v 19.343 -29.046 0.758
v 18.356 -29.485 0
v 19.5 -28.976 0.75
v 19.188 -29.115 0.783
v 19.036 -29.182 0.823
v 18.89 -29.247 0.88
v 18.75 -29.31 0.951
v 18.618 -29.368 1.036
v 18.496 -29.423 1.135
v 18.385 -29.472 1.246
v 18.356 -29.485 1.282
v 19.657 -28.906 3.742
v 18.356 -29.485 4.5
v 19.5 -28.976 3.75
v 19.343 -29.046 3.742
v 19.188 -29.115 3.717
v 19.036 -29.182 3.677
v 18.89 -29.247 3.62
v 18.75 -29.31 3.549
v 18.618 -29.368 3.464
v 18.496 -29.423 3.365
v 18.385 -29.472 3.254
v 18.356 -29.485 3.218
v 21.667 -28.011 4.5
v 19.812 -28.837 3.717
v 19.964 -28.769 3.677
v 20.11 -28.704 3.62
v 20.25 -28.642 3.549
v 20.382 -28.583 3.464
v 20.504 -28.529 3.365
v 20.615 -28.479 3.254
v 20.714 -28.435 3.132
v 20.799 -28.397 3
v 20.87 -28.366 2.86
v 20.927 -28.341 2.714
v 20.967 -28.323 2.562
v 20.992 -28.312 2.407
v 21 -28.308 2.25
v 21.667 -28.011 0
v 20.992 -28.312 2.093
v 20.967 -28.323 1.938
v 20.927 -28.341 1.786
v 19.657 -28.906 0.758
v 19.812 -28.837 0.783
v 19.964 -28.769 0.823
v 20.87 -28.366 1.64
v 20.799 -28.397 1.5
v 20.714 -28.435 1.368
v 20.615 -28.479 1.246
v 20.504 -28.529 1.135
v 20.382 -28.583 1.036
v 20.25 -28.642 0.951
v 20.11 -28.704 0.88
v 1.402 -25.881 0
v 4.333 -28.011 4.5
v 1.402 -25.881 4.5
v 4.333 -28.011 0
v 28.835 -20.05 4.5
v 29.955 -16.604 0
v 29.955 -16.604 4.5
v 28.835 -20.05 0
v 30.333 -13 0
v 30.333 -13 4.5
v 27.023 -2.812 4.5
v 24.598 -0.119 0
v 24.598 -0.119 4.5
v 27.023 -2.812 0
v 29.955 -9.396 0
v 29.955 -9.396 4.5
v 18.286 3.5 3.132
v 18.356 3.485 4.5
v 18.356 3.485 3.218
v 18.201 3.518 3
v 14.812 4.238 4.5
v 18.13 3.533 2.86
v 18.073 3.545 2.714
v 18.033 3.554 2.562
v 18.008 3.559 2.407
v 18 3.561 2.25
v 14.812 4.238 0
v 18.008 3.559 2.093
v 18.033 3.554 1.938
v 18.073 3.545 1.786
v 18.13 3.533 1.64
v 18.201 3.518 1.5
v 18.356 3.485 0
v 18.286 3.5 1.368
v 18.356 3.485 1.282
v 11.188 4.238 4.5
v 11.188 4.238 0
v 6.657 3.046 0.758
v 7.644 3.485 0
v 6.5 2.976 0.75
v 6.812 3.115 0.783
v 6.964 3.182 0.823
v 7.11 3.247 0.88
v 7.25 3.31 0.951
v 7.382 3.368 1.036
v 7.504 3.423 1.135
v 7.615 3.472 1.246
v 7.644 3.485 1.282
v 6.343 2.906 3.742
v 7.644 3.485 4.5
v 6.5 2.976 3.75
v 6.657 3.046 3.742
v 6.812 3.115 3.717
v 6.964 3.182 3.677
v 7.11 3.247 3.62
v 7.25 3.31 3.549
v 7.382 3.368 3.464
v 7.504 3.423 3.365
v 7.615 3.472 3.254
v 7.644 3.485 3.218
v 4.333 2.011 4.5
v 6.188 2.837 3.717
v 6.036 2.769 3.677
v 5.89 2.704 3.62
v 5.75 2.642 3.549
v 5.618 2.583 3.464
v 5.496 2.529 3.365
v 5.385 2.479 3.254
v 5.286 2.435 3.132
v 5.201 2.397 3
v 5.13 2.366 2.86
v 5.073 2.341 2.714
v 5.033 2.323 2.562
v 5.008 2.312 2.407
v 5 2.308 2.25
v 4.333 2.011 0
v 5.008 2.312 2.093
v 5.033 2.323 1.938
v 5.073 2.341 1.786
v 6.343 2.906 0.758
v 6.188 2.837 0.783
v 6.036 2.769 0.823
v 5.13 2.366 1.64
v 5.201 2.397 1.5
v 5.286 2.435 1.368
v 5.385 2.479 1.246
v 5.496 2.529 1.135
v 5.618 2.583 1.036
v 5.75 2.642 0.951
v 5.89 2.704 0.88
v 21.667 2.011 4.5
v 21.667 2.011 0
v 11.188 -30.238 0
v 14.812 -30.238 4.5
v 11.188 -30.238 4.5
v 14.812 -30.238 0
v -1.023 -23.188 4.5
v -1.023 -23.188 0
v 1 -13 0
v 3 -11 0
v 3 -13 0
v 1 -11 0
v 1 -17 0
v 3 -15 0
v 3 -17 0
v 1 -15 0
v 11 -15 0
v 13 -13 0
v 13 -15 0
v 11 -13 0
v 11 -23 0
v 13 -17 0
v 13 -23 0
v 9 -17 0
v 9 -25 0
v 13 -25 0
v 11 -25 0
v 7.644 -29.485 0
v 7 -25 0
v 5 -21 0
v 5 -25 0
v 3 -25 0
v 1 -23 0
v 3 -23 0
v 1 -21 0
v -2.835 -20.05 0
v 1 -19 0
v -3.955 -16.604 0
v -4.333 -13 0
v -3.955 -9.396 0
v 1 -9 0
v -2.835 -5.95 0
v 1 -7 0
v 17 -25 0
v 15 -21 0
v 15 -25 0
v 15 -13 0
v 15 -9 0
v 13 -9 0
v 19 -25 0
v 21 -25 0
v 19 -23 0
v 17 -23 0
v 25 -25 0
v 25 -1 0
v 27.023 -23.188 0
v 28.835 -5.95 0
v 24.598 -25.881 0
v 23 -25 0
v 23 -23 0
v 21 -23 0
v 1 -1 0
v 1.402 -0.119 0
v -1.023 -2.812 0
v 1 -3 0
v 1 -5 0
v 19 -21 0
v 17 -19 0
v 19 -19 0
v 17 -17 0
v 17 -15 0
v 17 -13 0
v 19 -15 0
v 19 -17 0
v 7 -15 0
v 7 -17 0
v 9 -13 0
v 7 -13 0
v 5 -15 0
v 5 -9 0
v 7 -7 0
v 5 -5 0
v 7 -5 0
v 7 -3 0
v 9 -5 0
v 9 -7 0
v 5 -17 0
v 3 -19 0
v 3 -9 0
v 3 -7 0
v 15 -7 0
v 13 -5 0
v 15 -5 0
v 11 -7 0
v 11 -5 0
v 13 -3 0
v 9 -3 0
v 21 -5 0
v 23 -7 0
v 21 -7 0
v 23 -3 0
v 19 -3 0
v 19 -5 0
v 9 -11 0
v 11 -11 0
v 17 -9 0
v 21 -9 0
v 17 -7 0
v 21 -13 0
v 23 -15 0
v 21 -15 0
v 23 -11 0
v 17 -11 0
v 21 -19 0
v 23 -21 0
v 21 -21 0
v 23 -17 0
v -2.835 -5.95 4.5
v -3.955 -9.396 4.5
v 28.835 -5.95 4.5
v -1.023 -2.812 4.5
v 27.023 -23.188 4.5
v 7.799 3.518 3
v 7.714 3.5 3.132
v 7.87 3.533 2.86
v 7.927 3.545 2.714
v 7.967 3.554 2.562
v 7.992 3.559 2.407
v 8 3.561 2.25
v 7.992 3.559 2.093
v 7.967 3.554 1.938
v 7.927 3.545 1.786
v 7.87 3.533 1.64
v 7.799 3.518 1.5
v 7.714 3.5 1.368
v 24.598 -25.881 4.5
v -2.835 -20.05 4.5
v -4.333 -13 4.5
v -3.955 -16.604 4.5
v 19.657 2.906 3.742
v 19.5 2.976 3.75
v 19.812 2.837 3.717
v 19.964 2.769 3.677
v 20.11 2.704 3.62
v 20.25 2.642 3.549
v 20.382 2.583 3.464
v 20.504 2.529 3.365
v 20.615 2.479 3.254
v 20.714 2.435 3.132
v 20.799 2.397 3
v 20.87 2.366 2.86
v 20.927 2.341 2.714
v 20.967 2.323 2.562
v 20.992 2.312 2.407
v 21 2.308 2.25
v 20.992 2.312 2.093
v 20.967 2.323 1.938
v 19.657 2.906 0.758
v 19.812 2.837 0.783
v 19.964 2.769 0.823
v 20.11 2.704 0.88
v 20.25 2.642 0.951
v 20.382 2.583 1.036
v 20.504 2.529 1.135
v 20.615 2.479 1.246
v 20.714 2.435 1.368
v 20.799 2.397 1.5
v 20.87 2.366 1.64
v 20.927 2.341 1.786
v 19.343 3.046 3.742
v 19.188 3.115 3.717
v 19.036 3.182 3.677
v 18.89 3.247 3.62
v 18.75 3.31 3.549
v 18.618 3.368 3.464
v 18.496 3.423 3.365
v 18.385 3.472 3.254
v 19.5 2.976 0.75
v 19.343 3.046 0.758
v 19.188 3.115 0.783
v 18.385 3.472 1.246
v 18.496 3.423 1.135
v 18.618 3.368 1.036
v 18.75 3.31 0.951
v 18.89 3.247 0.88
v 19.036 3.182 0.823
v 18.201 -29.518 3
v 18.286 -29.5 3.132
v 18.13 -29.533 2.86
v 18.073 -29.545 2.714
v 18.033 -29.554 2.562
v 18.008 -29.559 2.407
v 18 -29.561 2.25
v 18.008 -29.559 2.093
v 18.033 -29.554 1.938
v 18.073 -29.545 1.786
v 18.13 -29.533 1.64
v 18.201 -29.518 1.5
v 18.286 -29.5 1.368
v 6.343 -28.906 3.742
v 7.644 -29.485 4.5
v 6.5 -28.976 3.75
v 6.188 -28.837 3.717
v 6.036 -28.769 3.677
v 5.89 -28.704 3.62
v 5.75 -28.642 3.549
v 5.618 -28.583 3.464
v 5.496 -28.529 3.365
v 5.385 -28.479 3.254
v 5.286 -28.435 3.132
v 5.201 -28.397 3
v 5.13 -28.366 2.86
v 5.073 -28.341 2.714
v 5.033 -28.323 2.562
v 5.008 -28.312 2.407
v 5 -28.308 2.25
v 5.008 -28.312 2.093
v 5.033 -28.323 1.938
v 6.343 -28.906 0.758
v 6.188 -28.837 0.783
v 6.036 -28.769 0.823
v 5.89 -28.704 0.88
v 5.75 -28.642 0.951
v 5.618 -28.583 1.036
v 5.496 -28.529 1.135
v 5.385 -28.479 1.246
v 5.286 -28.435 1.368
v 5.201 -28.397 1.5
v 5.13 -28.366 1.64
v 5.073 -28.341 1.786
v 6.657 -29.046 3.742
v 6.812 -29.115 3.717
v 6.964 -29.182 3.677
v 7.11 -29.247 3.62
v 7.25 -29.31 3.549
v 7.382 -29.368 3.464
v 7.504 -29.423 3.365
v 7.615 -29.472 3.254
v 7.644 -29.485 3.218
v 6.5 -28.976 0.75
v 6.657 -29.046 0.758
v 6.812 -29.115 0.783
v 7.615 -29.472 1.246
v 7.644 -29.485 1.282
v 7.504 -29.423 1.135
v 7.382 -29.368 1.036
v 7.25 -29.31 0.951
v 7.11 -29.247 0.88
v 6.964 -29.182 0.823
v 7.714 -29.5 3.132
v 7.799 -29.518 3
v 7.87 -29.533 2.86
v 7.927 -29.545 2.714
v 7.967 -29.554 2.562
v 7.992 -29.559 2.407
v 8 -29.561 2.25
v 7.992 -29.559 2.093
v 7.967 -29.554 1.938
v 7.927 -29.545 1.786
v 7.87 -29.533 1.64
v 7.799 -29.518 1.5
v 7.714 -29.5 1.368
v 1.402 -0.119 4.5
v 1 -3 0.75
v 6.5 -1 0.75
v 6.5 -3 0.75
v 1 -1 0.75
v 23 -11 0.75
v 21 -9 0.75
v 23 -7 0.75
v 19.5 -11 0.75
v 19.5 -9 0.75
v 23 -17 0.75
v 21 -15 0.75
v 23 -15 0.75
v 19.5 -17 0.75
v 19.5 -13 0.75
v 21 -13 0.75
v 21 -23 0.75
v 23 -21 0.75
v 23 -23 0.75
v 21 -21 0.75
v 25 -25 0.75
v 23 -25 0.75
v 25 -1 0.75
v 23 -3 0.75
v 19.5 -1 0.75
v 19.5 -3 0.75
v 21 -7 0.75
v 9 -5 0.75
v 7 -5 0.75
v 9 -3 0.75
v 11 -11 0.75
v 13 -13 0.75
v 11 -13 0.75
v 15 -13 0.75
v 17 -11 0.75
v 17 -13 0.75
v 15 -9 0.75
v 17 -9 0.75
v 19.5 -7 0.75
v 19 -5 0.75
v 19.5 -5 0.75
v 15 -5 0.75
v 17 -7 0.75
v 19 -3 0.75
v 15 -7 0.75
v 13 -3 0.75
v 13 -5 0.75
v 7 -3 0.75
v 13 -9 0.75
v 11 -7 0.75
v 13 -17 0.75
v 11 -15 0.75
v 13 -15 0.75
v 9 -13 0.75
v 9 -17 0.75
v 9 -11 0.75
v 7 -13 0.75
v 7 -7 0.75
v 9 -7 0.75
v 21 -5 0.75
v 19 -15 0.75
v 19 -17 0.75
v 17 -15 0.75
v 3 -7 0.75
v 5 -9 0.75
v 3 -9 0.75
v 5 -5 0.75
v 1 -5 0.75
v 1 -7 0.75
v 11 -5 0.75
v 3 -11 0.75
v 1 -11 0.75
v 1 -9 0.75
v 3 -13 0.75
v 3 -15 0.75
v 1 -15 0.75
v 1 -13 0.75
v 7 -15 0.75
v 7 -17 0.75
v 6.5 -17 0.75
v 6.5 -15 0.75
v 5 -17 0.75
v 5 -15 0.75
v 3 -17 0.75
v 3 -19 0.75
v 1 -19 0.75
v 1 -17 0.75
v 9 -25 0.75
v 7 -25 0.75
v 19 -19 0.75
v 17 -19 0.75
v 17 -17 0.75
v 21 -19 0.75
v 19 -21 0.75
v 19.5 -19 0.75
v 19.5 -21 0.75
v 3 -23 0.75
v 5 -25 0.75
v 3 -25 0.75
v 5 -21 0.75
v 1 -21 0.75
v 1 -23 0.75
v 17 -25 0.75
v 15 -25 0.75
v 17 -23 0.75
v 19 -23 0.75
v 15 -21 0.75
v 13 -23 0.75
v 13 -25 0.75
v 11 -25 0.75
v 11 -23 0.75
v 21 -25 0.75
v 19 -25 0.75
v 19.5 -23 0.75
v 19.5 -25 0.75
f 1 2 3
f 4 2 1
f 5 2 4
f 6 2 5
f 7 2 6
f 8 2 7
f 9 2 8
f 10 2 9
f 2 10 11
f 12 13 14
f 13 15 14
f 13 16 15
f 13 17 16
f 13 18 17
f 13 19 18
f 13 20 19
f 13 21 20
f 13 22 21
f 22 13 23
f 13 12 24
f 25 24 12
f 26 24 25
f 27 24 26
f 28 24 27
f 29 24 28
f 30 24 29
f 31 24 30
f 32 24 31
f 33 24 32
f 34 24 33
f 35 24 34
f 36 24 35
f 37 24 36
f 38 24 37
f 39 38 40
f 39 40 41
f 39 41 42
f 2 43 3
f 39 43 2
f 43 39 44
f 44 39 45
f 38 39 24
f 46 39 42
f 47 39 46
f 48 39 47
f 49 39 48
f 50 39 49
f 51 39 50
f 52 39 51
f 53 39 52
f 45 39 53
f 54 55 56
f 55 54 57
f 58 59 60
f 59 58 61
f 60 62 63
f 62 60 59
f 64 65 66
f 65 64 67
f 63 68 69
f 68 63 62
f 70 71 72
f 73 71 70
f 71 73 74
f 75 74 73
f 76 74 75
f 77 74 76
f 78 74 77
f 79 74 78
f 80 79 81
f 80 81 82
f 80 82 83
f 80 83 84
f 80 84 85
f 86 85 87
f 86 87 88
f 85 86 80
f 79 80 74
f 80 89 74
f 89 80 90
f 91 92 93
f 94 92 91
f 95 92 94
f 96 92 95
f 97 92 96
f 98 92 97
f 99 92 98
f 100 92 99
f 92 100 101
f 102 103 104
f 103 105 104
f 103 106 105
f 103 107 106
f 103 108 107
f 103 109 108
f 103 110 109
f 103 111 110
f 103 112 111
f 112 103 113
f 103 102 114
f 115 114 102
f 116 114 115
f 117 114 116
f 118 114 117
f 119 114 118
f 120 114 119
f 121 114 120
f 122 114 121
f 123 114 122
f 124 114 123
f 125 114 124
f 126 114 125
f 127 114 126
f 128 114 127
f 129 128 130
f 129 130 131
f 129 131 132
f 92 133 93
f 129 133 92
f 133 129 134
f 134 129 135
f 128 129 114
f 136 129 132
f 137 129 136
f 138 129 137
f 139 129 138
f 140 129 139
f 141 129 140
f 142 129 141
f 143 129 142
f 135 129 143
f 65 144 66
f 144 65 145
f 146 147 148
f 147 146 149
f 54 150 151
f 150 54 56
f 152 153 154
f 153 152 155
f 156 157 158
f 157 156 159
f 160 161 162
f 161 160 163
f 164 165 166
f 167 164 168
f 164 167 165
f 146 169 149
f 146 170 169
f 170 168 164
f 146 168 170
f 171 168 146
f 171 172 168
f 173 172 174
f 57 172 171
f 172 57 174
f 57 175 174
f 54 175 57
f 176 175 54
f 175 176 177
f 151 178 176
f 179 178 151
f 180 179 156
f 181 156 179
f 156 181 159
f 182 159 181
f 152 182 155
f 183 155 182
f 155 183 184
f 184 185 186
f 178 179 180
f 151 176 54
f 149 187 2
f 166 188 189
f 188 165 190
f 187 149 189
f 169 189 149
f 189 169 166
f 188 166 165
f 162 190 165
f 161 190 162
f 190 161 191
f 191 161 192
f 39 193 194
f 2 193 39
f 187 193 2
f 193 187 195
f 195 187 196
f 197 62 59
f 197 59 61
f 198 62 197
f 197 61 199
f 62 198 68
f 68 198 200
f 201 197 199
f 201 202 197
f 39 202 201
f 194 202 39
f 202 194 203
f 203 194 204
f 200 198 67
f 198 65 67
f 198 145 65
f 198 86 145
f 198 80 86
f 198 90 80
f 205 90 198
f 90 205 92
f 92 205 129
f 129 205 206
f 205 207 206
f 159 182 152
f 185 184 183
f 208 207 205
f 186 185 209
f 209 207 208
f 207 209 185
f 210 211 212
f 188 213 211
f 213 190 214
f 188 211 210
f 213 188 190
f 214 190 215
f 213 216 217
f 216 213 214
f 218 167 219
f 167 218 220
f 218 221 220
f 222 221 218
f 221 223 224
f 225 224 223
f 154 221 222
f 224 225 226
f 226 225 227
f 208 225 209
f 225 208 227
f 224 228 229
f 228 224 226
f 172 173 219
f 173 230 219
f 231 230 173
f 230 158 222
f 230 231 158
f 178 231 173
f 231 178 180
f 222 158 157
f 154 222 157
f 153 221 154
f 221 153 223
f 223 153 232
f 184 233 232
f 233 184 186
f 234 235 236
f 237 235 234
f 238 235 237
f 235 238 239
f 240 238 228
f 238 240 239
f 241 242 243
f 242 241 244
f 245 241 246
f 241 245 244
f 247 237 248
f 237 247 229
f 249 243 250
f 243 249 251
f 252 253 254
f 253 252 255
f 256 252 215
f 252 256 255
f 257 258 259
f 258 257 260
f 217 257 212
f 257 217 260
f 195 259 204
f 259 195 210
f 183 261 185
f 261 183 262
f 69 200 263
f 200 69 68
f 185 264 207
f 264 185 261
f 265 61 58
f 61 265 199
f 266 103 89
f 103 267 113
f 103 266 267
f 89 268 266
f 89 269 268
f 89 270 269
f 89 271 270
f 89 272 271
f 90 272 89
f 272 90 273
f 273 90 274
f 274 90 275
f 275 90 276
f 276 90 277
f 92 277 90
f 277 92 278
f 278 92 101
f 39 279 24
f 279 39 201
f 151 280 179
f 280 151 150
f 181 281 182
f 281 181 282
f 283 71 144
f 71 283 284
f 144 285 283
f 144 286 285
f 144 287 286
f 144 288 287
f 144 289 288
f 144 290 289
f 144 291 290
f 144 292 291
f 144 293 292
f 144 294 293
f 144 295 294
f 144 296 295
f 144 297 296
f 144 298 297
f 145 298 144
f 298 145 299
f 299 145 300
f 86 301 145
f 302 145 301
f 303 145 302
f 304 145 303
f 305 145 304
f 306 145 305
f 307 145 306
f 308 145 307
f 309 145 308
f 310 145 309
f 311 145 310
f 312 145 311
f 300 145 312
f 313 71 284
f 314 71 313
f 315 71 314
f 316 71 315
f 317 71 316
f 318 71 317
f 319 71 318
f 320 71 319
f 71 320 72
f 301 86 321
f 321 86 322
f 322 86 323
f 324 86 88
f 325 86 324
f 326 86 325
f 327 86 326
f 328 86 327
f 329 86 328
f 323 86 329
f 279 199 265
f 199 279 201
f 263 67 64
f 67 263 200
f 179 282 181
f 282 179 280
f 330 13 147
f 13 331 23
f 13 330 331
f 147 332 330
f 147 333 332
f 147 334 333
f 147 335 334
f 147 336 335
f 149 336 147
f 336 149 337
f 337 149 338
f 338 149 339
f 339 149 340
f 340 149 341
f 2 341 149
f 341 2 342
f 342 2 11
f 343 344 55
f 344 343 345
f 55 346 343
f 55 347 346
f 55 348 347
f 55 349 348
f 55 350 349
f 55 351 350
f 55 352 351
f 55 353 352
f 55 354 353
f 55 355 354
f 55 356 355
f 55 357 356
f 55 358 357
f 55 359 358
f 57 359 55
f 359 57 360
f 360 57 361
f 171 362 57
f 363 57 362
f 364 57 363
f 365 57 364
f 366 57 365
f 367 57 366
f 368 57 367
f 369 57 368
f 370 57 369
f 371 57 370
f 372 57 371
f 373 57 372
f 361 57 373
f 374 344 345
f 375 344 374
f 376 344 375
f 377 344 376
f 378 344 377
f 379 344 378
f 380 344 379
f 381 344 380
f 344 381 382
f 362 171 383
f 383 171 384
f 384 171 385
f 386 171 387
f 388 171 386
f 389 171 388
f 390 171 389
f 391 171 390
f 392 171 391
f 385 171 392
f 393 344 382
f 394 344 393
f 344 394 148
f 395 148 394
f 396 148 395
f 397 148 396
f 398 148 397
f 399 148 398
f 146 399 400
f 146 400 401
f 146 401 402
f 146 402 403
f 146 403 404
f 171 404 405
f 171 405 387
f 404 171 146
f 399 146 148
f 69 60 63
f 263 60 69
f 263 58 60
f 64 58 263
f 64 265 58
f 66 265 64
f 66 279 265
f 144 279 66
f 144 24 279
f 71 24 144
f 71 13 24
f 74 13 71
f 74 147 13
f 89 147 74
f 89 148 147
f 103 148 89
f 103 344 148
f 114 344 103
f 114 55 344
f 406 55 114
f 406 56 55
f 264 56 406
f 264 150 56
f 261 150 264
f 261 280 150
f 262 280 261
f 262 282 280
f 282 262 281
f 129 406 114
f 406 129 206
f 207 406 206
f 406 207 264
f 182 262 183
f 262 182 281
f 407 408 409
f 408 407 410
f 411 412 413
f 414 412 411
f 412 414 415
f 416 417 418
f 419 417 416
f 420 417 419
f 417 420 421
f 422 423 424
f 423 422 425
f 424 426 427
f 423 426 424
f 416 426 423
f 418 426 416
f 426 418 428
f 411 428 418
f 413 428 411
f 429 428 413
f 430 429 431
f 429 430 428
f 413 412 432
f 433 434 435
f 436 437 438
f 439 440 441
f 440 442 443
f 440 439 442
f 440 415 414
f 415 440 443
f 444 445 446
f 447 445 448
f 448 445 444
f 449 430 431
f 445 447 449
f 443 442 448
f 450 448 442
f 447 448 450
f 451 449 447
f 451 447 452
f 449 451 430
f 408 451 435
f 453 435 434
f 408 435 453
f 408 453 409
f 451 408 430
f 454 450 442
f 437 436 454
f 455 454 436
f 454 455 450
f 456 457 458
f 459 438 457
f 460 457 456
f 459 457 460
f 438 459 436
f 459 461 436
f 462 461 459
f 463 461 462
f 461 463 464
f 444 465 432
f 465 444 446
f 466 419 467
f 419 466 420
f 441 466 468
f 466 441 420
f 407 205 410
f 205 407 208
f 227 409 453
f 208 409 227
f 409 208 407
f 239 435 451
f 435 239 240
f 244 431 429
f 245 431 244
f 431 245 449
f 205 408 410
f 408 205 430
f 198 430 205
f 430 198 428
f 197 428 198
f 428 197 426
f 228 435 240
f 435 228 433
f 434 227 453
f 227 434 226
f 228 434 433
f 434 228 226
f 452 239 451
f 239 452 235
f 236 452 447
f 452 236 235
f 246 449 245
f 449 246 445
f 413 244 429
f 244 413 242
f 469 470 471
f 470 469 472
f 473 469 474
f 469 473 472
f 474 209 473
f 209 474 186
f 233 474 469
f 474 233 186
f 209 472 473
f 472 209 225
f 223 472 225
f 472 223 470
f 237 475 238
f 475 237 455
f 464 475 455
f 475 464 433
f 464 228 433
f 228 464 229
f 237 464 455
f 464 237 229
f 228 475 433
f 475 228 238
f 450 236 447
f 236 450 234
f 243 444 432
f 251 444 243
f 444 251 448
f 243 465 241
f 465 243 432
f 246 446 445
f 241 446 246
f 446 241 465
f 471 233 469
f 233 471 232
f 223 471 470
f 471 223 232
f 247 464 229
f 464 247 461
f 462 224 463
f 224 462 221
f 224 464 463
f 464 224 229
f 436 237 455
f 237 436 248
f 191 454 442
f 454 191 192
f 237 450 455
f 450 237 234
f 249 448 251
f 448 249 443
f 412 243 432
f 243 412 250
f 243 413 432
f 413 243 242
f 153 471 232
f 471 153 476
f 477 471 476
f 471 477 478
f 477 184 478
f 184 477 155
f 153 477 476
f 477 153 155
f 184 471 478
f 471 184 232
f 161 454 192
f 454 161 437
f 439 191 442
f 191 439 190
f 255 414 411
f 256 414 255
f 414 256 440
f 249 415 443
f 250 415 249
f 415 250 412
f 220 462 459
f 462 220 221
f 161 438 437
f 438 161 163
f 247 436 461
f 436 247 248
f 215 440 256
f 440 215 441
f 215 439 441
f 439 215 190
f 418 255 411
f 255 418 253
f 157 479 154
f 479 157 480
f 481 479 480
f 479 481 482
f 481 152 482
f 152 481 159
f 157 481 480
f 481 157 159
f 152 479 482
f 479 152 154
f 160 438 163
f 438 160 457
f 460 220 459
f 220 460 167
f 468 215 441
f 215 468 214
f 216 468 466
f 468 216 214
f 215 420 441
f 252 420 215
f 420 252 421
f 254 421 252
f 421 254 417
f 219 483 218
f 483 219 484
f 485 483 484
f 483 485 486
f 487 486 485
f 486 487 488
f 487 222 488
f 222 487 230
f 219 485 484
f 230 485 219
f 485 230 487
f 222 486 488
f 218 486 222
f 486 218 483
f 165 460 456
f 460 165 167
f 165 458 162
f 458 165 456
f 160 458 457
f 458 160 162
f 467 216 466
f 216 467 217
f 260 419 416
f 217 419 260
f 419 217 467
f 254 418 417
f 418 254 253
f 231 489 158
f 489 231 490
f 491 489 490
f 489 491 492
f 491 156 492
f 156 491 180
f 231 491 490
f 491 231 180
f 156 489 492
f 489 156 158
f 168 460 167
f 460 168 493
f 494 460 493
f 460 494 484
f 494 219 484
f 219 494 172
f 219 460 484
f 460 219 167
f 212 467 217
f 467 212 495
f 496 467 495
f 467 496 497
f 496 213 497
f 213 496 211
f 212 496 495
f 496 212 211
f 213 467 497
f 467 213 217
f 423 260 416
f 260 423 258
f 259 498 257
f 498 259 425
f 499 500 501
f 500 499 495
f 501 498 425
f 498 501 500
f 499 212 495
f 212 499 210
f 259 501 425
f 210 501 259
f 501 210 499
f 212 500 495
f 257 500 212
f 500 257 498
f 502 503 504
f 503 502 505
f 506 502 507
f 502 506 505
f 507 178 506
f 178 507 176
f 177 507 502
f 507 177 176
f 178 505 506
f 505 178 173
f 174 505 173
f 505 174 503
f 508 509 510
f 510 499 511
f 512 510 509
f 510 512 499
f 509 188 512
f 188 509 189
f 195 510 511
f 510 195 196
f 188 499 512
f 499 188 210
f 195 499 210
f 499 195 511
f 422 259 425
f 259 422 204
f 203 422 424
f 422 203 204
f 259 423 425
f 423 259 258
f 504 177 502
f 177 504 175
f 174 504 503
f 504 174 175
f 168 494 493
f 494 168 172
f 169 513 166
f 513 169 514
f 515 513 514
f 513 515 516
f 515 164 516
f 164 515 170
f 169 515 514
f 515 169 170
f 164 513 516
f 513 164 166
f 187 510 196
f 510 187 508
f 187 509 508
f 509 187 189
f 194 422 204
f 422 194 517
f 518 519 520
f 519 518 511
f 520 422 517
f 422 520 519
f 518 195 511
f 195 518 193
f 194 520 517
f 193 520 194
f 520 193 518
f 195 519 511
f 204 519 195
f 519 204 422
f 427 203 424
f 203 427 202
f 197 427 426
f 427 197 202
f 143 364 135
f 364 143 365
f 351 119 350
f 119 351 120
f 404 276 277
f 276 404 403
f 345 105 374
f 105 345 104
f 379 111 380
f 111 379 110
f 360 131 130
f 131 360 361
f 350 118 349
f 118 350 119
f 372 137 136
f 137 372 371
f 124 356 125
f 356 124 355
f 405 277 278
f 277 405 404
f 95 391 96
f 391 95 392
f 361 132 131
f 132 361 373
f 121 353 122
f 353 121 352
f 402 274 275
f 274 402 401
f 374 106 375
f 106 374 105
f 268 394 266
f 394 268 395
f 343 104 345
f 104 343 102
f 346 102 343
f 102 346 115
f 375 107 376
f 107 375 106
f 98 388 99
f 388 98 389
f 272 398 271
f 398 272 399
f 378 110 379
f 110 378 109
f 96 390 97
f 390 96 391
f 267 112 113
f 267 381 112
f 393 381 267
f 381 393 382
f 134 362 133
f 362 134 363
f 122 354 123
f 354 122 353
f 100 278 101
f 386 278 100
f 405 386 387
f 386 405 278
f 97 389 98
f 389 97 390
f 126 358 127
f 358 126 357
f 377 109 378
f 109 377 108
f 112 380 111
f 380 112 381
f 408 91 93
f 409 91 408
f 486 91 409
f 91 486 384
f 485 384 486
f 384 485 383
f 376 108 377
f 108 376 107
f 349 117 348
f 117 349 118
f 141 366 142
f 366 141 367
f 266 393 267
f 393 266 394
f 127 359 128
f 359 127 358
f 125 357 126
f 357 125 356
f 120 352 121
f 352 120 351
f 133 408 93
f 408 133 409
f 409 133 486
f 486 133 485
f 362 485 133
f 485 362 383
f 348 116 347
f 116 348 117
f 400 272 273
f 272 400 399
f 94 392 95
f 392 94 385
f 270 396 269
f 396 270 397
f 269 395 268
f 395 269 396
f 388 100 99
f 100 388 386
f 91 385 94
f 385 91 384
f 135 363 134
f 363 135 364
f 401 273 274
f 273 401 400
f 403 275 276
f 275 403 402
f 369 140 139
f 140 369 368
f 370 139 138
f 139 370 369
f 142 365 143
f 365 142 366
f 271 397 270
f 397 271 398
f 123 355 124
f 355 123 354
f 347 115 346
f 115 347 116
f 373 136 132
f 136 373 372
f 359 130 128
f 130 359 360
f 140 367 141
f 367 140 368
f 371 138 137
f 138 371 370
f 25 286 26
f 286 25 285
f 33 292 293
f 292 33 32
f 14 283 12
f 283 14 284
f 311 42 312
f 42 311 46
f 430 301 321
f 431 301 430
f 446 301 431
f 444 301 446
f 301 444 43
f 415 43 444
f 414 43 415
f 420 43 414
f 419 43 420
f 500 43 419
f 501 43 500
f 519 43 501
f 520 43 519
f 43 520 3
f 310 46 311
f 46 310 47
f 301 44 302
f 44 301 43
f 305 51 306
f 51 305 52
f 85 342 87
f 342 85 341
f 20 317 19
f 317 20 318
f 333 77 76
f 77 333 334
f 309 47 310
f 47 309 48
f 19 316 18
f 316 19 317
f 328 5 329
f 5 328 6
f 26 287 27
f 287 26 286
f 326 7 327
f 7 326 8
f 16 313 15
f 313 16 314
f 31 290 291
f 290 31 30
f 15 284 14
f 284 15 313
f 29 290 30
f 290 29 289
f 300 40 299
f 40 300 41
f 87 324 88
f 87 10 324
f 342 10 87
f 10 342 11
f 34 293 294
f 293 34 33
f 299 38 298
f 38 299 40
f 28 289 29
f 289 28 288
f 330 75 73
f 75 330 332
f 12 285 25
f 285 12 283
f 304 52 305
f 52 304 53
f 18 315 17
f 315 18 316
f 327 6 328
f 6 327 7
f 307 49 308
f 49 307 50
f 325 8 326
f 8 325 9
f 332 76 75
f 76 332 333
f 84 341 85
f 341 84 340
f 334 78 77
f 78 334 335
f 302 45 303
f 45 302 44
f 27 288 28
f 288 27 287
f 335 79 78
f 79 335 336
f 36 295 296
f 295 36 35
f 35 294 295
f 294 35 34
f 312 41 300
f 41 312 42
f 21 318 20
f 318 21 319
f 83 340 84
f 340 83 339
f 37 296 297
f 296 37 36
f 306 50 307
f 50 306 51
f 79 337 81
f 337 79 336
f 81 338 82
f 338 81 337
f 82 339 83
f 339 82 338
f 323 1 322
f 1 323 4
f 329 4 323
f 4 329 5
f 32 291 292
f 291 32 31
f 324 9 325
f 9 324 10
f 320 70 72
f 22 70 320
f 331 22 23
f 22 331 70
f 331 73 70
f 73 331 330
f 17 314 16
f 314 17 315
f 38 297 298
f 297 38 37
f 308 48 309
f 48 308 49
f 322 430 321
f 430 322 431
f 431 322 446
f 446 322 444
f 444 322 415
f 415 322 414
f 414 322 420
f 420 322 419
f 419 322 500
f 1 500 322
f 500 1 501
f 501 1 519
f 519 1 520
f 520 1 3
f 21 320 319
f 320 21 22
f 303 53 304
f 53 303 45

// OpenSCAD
rotate([180,0,0])difference(){translate([13,13,-2.25])  cylinder(r=17.3333333333333,h=4.5, center=true);
translate([2,2,0])  cube(size = [2,2,1.5], center=true);
translate([4,2,0])  cube(size = [2,2,1.5], center=true);
translate([6,2,0])  cube(size = [2,2,1.5], center=true);
translate([8,2,0])  cube(size = [2,2,1.5], center=true);
translate([10,2,0])  cube(size = [2,2,1.5], center=true);
translate([12,2,0])  cube(size = [2,2,1.5], center=true);
translate([14,2,0])  cube(size = [2,2,1.5], center=true);
translate([16,2,0])  cube(size = [2,2,1.5], center=true);
translate([18,2,0])  cube(size = [2,2,1.5], center=true);
translate([20,2,0])  cube(size = [2,2,1.5], center=true);
translate([22,2,0])  cube(size = [2,2,1.5], center=true);
translate([24,2,0])  cube(size = [2,2,1.5], center=true);
translate([24,2,0])  cube(size = [2,2,1.5], center=true);
translate([24,2,0])  cube(size = [2,2,1.5], center=true);
translate([24,2,0])  cube(size = [2,2,1.5], center=true);
translate([8,4,0])  cube(size = [2,2,1.5], center=true);
translate([8,4,0])  cube(size = [2,2,1.5], center=true);
translate([8,4,0])  cube(size = [2,2,1.5], center=true);
translate([14,4,0])  cube(size = [2,2,1.5], center=true);
translate([16,4,0])  cube(size = [2,2,1.5], center=true);
translate([18,4,0])  cube(size = [2,2,1.5], center=true);
translate([18,4,0])  cube(size = [2,2,1.5], center=true);
translate([18,4,0])  cube(size = [2,2,1.5], center=true);
translate([24,4,0])  cube(size = [2,2,1.5], center=true);
translate([2,6,0])  cube(size = [2,2,1.5], center=true);
translate([4,6,0])  cube(size = [2,2,1.5], center=true);
translate([4,6,0])  cube(size = [2,2,1.5], center=true);
translate([4,6,0])  cube(size = [2,2,1.5], center=true);
translate([10,6,0])  cube(size = [2,2,1.5], center=true);
translate([10,6,0])  cube(size = [2,2,1.5], center=true);
translate([10,6,0])  cube(size = [2,2,1.5], center=true);
translate([16,6,0])  cube(size = [2,2,1.5], center=true);
translate([18,6,0])  cube(size = [2,2,1.5], center=true);
translate([20,6,0])  cube(size = [2,2,1.5], center=true);
translate([20,6,0])  cube(size = [2,2,1.5], center=true);
translate([24,6,0])  cube(size = [2,2,1.5], center=true);
translate([24,6,0])  cube(size = [2,2,1.5], center=true);
translate([4,8,0])  cube(size = [2,2,1.5], center=true);
translate([4,8,0])  cube(size = [2,2,1.5], center=true);
translate([8,8,0])  cube(size = [2,2,1.5], center=true);
translate([8,8,0])  cube(size = [2,2,1.5], center=true);
translate([12,8,0])  cube(size = [2,2,1.5], center=true);
translate([14,8,0])  cube(size = [2,2,1.5], center=true);
translate([16,8,0])  cube(size = [2,2,1.5], center=true);
translate([16,8,0])  cube(size = [2,2,1.5], center=true);
translate([16,8,0])  cube(size = [2,2,1.5], center=true);
translate([22,8,0])  cube(size = [2,2,1.5], center=true);
translate([24,8,0])  cube(size = [2,2,1.5], center=true);
translate([2,10,0])  cube(size = [2,2,1.5], center=true);
translate([2,10,0])  cube(size = [2,2,1.5], center=true);
translate([2,10,0])  cube(size = [2,2,1.5], center=true);
translate([8,10,0])  cube(size = [2,2,1.5], center=true);
translate([8,10,0])  cube(size = [2,2,1.5], center=true);
translate([12,10,0])  cube(size = [2,2,1.5], center=true);
translate([12,10,0])  cube(size = [2,2,1.5], center=true);
translate([16,10,0])  cube(size = [2,2,1.5], center=true);
translate([18,10,0])  cube(size = [2,2,1.5], center=true);
translate([20,10,0])  cube(size = [2,2,1.5], center=true);
translate([22,10,0])  cube(size = [2,2,1.5], center=true);
translate([24,10,0])  cube(size = [2,2,1.5], center=true);
translate([24,10,0])  cube(size = [2,2,1.5], center=true);
translate([24,10,0])  cube(size = [2,2,1.5], center=true);
translate([24,10,0])  cube(size = [2,2,1.5], center=true);
translate([8,12,0])  cube(size = [2,2,1.5], center=true);
translate([10,12,0])  cube(size = [2,2,1.5], center=true);
translate([12,12,0])  cube(size = [2,2,1.5], center=true);
translate([12,12,0])  cube(size = [2,2,1.5], center=true);
translate([16,12,0])  cube(size = [2,2,1.5], center=true);
translate([16,12,0])  cube(size = [2,2,1.5], center=true);
translate([16,12,0])  cube(size = [2,2,1.5], center=true);
translate([16,12,0])  cube(size = [2,2,1.5], center=true);
translate([24,12,0])  cube(size = [2,2,1.5], center=true);
translate([2,14,0])  cube(size = [2,2,1.5], center=true);
translate([2,14,0])  cube(size = [2,2,1.5], center=true);
translate([2,14,0])  cube(size = [2,2,1.5], center=true);
translate([2,14,0])  cube(size = [2,2,1.5], center=true);
translate([10,14,0])  cube(size = [2,2,1.5], center=true);
translate([10,14,0])  cube(size = [2,2,1.5], center=true);
translate([10,14,0])  cube(size = [2,2,1.5], center=true);
translate([10,14,0])  cube(size = [2,2,1.5], center=true);
translate([18,14,0])  cube(size = [2,2,1.5], center=true);
translate([20,14,0])  cube(size = [2,2,1.5], center=true);
translate([20,14,0])  cube(size = [2,2,1.5], center=true);
translate([24,14,0])  cube(size = [2,2,1.5], center=true);
translate([24,14,0])  cube(size = [2,2,1.5], center=true);
translate([24,14,0])  cube(size = [2,2,1.5], center=true);
translate([6,16,0])  cube(size = [2,2,1.5], center=true);
translate([6,16,0])  cube(size = [2,2,1.5], center=true);
translate([10,16,0])  cube(size = [2,2,1.5], center=true);
translate([12,16,0])  cube(size = [2,2,1.5], center=true);
translate([12,16,0])  cube(size = [2,2,1.5], center=true);
translate([12,16,0])  cube(size = [2,2,1.5], center=true);
translate([12,16,0])  cube(size = [2,2,1.5], center=true);
translate([20,16,0])  cube(size = [2,2,1.5], center=true);
translate([22,16,0])  cube(size = [2,2,1.5], center=true);
translate([24,16,0])  cube(size = [2,2,1.5], center=true);
translate([2,18,0])  cube(size = [2,2,1.5], center=true);
translate([2,18,0])  cube(size = [2,2,1.5], center=true);
translate([2,18,0])  cube(size = [2,2,1.5], center=true);
translate([8,18,0])  cube(size = [2,2,1.5], center=true);
translate([8,18,0])  cube(size = [2,2,1.5], center=true);
translate([8,18,0])  cube(size = [2,2,1.5], center=true);
translate([8,18,0])  cube(size = [2,2,1.5], center=true);
translate([8,18,0])  cube(size = [2,2,1.5], center=true);
translate([18,18,0])  cube(size = [2,2,1.5], center=true);
translate([18,18,0])  cube(size = [2,2,1.5], center=true);
translate([18,18,0])  cube(size = [2,2,1.5], center=true);
translate([24,18,0])  cube(size = [2,2,1.5], center=true);
translate([24,18,0])  cube(size = [2,2,1.5], center=true);
translate([24,18,0])  cube(size = [2,2,1.5], center=true);
translate([24,18,0])  cube(size = [2,2,1.5], center=true);
translate([8,20,0])  cube(size = [2,2,1.5], center=true);
translate([8,20,0])  cube(size = [2,2,1.5], center=true);
translate([8,20,0])  cube(size = [2,2,1.5], center=true);
translate([8,20,0])  cube(size = [2,2,1.5], center=true);
translate([8,20,0])  cube(size = [2,2,1.5], center=true);
translate([8,20,0])  cube(size = [2,2,1.5], center=true);
translate([20,20,0])  cube(size = [2,2,1.5], center=true);
translate([20,20,0])  cube(size = [2,2,1.5], center=true);
translate([24,20,0])  cube(size = [2,2,1.5], center=true);
translate([2,22,0])  cube(size = [2,2,1.5], center=true);
translate([4,22,0])  cube(size = [2,2,1.5], center=true);
translate([4,22,0])  cube(size = [2,2,1.5], center=true);
translate([8,22,0])  cube(size = [2,2,1.5], center=true);
translate([8,22,0])  cube(size = [2,2,1.5], center=true);
translate([8,22,0])  cube(size = [2,2,1.5], center=true);
translate([8,22,0])  cube(size = [2,2,1.5], center=true);
translate([16,22,0])  cube(size = [2,2,1.5], center=true);
translate([18,22,0])  cube(size = [2,2,1.5], center=true);
translate([18,22,0])  cube(size = [2,2,1.5], center=true);
translate([22,22,0])  cube(size = [2,2,1.5], center=true);
translate([24,22,0])  cube(size = [2,2,1.5], center=true);
translate([24,22,0])  cube(size = [2,2,1.5], center=true);
translate([4,24,0])  cube(size = [2,2,1.5], center=true);
translate([4,24,0])  cube(size = [2,2,1.5], center=true);
translate([8,24,0])  cube(size = [2,2,1.5], center=true);
translate([8,24,0])  cube(size = [2,2,1.5], center=true);
translate([12,24,0])  cube(size = [2,2,1.5], center=true);
translate([12,24,0])  cube(size = [2,2,1.5], center=true);
translate([16,24,0])  cube(size = [2,2,1.5], center=true);
translate([16,24,0])  cube(size = [2,2,1.5], center=true);
translate([20,24,0])  cube(size = [2,2,1.5], center=true);
translate([20,24,0])  cube(size = [2,2,1.5], center=true);
translate([24,24,0])  cube(size = [2,2,1.5], center=true);
rotate([90,90,0])translate([2.25,6.5,0])  cylinder(r=1.5,h=400, $fn=60, center=true);
rotate([90,90,0])translate([2.25,19.5,0])  cylinder(r=1.5,h=400, $fn=60, center=true);
}
